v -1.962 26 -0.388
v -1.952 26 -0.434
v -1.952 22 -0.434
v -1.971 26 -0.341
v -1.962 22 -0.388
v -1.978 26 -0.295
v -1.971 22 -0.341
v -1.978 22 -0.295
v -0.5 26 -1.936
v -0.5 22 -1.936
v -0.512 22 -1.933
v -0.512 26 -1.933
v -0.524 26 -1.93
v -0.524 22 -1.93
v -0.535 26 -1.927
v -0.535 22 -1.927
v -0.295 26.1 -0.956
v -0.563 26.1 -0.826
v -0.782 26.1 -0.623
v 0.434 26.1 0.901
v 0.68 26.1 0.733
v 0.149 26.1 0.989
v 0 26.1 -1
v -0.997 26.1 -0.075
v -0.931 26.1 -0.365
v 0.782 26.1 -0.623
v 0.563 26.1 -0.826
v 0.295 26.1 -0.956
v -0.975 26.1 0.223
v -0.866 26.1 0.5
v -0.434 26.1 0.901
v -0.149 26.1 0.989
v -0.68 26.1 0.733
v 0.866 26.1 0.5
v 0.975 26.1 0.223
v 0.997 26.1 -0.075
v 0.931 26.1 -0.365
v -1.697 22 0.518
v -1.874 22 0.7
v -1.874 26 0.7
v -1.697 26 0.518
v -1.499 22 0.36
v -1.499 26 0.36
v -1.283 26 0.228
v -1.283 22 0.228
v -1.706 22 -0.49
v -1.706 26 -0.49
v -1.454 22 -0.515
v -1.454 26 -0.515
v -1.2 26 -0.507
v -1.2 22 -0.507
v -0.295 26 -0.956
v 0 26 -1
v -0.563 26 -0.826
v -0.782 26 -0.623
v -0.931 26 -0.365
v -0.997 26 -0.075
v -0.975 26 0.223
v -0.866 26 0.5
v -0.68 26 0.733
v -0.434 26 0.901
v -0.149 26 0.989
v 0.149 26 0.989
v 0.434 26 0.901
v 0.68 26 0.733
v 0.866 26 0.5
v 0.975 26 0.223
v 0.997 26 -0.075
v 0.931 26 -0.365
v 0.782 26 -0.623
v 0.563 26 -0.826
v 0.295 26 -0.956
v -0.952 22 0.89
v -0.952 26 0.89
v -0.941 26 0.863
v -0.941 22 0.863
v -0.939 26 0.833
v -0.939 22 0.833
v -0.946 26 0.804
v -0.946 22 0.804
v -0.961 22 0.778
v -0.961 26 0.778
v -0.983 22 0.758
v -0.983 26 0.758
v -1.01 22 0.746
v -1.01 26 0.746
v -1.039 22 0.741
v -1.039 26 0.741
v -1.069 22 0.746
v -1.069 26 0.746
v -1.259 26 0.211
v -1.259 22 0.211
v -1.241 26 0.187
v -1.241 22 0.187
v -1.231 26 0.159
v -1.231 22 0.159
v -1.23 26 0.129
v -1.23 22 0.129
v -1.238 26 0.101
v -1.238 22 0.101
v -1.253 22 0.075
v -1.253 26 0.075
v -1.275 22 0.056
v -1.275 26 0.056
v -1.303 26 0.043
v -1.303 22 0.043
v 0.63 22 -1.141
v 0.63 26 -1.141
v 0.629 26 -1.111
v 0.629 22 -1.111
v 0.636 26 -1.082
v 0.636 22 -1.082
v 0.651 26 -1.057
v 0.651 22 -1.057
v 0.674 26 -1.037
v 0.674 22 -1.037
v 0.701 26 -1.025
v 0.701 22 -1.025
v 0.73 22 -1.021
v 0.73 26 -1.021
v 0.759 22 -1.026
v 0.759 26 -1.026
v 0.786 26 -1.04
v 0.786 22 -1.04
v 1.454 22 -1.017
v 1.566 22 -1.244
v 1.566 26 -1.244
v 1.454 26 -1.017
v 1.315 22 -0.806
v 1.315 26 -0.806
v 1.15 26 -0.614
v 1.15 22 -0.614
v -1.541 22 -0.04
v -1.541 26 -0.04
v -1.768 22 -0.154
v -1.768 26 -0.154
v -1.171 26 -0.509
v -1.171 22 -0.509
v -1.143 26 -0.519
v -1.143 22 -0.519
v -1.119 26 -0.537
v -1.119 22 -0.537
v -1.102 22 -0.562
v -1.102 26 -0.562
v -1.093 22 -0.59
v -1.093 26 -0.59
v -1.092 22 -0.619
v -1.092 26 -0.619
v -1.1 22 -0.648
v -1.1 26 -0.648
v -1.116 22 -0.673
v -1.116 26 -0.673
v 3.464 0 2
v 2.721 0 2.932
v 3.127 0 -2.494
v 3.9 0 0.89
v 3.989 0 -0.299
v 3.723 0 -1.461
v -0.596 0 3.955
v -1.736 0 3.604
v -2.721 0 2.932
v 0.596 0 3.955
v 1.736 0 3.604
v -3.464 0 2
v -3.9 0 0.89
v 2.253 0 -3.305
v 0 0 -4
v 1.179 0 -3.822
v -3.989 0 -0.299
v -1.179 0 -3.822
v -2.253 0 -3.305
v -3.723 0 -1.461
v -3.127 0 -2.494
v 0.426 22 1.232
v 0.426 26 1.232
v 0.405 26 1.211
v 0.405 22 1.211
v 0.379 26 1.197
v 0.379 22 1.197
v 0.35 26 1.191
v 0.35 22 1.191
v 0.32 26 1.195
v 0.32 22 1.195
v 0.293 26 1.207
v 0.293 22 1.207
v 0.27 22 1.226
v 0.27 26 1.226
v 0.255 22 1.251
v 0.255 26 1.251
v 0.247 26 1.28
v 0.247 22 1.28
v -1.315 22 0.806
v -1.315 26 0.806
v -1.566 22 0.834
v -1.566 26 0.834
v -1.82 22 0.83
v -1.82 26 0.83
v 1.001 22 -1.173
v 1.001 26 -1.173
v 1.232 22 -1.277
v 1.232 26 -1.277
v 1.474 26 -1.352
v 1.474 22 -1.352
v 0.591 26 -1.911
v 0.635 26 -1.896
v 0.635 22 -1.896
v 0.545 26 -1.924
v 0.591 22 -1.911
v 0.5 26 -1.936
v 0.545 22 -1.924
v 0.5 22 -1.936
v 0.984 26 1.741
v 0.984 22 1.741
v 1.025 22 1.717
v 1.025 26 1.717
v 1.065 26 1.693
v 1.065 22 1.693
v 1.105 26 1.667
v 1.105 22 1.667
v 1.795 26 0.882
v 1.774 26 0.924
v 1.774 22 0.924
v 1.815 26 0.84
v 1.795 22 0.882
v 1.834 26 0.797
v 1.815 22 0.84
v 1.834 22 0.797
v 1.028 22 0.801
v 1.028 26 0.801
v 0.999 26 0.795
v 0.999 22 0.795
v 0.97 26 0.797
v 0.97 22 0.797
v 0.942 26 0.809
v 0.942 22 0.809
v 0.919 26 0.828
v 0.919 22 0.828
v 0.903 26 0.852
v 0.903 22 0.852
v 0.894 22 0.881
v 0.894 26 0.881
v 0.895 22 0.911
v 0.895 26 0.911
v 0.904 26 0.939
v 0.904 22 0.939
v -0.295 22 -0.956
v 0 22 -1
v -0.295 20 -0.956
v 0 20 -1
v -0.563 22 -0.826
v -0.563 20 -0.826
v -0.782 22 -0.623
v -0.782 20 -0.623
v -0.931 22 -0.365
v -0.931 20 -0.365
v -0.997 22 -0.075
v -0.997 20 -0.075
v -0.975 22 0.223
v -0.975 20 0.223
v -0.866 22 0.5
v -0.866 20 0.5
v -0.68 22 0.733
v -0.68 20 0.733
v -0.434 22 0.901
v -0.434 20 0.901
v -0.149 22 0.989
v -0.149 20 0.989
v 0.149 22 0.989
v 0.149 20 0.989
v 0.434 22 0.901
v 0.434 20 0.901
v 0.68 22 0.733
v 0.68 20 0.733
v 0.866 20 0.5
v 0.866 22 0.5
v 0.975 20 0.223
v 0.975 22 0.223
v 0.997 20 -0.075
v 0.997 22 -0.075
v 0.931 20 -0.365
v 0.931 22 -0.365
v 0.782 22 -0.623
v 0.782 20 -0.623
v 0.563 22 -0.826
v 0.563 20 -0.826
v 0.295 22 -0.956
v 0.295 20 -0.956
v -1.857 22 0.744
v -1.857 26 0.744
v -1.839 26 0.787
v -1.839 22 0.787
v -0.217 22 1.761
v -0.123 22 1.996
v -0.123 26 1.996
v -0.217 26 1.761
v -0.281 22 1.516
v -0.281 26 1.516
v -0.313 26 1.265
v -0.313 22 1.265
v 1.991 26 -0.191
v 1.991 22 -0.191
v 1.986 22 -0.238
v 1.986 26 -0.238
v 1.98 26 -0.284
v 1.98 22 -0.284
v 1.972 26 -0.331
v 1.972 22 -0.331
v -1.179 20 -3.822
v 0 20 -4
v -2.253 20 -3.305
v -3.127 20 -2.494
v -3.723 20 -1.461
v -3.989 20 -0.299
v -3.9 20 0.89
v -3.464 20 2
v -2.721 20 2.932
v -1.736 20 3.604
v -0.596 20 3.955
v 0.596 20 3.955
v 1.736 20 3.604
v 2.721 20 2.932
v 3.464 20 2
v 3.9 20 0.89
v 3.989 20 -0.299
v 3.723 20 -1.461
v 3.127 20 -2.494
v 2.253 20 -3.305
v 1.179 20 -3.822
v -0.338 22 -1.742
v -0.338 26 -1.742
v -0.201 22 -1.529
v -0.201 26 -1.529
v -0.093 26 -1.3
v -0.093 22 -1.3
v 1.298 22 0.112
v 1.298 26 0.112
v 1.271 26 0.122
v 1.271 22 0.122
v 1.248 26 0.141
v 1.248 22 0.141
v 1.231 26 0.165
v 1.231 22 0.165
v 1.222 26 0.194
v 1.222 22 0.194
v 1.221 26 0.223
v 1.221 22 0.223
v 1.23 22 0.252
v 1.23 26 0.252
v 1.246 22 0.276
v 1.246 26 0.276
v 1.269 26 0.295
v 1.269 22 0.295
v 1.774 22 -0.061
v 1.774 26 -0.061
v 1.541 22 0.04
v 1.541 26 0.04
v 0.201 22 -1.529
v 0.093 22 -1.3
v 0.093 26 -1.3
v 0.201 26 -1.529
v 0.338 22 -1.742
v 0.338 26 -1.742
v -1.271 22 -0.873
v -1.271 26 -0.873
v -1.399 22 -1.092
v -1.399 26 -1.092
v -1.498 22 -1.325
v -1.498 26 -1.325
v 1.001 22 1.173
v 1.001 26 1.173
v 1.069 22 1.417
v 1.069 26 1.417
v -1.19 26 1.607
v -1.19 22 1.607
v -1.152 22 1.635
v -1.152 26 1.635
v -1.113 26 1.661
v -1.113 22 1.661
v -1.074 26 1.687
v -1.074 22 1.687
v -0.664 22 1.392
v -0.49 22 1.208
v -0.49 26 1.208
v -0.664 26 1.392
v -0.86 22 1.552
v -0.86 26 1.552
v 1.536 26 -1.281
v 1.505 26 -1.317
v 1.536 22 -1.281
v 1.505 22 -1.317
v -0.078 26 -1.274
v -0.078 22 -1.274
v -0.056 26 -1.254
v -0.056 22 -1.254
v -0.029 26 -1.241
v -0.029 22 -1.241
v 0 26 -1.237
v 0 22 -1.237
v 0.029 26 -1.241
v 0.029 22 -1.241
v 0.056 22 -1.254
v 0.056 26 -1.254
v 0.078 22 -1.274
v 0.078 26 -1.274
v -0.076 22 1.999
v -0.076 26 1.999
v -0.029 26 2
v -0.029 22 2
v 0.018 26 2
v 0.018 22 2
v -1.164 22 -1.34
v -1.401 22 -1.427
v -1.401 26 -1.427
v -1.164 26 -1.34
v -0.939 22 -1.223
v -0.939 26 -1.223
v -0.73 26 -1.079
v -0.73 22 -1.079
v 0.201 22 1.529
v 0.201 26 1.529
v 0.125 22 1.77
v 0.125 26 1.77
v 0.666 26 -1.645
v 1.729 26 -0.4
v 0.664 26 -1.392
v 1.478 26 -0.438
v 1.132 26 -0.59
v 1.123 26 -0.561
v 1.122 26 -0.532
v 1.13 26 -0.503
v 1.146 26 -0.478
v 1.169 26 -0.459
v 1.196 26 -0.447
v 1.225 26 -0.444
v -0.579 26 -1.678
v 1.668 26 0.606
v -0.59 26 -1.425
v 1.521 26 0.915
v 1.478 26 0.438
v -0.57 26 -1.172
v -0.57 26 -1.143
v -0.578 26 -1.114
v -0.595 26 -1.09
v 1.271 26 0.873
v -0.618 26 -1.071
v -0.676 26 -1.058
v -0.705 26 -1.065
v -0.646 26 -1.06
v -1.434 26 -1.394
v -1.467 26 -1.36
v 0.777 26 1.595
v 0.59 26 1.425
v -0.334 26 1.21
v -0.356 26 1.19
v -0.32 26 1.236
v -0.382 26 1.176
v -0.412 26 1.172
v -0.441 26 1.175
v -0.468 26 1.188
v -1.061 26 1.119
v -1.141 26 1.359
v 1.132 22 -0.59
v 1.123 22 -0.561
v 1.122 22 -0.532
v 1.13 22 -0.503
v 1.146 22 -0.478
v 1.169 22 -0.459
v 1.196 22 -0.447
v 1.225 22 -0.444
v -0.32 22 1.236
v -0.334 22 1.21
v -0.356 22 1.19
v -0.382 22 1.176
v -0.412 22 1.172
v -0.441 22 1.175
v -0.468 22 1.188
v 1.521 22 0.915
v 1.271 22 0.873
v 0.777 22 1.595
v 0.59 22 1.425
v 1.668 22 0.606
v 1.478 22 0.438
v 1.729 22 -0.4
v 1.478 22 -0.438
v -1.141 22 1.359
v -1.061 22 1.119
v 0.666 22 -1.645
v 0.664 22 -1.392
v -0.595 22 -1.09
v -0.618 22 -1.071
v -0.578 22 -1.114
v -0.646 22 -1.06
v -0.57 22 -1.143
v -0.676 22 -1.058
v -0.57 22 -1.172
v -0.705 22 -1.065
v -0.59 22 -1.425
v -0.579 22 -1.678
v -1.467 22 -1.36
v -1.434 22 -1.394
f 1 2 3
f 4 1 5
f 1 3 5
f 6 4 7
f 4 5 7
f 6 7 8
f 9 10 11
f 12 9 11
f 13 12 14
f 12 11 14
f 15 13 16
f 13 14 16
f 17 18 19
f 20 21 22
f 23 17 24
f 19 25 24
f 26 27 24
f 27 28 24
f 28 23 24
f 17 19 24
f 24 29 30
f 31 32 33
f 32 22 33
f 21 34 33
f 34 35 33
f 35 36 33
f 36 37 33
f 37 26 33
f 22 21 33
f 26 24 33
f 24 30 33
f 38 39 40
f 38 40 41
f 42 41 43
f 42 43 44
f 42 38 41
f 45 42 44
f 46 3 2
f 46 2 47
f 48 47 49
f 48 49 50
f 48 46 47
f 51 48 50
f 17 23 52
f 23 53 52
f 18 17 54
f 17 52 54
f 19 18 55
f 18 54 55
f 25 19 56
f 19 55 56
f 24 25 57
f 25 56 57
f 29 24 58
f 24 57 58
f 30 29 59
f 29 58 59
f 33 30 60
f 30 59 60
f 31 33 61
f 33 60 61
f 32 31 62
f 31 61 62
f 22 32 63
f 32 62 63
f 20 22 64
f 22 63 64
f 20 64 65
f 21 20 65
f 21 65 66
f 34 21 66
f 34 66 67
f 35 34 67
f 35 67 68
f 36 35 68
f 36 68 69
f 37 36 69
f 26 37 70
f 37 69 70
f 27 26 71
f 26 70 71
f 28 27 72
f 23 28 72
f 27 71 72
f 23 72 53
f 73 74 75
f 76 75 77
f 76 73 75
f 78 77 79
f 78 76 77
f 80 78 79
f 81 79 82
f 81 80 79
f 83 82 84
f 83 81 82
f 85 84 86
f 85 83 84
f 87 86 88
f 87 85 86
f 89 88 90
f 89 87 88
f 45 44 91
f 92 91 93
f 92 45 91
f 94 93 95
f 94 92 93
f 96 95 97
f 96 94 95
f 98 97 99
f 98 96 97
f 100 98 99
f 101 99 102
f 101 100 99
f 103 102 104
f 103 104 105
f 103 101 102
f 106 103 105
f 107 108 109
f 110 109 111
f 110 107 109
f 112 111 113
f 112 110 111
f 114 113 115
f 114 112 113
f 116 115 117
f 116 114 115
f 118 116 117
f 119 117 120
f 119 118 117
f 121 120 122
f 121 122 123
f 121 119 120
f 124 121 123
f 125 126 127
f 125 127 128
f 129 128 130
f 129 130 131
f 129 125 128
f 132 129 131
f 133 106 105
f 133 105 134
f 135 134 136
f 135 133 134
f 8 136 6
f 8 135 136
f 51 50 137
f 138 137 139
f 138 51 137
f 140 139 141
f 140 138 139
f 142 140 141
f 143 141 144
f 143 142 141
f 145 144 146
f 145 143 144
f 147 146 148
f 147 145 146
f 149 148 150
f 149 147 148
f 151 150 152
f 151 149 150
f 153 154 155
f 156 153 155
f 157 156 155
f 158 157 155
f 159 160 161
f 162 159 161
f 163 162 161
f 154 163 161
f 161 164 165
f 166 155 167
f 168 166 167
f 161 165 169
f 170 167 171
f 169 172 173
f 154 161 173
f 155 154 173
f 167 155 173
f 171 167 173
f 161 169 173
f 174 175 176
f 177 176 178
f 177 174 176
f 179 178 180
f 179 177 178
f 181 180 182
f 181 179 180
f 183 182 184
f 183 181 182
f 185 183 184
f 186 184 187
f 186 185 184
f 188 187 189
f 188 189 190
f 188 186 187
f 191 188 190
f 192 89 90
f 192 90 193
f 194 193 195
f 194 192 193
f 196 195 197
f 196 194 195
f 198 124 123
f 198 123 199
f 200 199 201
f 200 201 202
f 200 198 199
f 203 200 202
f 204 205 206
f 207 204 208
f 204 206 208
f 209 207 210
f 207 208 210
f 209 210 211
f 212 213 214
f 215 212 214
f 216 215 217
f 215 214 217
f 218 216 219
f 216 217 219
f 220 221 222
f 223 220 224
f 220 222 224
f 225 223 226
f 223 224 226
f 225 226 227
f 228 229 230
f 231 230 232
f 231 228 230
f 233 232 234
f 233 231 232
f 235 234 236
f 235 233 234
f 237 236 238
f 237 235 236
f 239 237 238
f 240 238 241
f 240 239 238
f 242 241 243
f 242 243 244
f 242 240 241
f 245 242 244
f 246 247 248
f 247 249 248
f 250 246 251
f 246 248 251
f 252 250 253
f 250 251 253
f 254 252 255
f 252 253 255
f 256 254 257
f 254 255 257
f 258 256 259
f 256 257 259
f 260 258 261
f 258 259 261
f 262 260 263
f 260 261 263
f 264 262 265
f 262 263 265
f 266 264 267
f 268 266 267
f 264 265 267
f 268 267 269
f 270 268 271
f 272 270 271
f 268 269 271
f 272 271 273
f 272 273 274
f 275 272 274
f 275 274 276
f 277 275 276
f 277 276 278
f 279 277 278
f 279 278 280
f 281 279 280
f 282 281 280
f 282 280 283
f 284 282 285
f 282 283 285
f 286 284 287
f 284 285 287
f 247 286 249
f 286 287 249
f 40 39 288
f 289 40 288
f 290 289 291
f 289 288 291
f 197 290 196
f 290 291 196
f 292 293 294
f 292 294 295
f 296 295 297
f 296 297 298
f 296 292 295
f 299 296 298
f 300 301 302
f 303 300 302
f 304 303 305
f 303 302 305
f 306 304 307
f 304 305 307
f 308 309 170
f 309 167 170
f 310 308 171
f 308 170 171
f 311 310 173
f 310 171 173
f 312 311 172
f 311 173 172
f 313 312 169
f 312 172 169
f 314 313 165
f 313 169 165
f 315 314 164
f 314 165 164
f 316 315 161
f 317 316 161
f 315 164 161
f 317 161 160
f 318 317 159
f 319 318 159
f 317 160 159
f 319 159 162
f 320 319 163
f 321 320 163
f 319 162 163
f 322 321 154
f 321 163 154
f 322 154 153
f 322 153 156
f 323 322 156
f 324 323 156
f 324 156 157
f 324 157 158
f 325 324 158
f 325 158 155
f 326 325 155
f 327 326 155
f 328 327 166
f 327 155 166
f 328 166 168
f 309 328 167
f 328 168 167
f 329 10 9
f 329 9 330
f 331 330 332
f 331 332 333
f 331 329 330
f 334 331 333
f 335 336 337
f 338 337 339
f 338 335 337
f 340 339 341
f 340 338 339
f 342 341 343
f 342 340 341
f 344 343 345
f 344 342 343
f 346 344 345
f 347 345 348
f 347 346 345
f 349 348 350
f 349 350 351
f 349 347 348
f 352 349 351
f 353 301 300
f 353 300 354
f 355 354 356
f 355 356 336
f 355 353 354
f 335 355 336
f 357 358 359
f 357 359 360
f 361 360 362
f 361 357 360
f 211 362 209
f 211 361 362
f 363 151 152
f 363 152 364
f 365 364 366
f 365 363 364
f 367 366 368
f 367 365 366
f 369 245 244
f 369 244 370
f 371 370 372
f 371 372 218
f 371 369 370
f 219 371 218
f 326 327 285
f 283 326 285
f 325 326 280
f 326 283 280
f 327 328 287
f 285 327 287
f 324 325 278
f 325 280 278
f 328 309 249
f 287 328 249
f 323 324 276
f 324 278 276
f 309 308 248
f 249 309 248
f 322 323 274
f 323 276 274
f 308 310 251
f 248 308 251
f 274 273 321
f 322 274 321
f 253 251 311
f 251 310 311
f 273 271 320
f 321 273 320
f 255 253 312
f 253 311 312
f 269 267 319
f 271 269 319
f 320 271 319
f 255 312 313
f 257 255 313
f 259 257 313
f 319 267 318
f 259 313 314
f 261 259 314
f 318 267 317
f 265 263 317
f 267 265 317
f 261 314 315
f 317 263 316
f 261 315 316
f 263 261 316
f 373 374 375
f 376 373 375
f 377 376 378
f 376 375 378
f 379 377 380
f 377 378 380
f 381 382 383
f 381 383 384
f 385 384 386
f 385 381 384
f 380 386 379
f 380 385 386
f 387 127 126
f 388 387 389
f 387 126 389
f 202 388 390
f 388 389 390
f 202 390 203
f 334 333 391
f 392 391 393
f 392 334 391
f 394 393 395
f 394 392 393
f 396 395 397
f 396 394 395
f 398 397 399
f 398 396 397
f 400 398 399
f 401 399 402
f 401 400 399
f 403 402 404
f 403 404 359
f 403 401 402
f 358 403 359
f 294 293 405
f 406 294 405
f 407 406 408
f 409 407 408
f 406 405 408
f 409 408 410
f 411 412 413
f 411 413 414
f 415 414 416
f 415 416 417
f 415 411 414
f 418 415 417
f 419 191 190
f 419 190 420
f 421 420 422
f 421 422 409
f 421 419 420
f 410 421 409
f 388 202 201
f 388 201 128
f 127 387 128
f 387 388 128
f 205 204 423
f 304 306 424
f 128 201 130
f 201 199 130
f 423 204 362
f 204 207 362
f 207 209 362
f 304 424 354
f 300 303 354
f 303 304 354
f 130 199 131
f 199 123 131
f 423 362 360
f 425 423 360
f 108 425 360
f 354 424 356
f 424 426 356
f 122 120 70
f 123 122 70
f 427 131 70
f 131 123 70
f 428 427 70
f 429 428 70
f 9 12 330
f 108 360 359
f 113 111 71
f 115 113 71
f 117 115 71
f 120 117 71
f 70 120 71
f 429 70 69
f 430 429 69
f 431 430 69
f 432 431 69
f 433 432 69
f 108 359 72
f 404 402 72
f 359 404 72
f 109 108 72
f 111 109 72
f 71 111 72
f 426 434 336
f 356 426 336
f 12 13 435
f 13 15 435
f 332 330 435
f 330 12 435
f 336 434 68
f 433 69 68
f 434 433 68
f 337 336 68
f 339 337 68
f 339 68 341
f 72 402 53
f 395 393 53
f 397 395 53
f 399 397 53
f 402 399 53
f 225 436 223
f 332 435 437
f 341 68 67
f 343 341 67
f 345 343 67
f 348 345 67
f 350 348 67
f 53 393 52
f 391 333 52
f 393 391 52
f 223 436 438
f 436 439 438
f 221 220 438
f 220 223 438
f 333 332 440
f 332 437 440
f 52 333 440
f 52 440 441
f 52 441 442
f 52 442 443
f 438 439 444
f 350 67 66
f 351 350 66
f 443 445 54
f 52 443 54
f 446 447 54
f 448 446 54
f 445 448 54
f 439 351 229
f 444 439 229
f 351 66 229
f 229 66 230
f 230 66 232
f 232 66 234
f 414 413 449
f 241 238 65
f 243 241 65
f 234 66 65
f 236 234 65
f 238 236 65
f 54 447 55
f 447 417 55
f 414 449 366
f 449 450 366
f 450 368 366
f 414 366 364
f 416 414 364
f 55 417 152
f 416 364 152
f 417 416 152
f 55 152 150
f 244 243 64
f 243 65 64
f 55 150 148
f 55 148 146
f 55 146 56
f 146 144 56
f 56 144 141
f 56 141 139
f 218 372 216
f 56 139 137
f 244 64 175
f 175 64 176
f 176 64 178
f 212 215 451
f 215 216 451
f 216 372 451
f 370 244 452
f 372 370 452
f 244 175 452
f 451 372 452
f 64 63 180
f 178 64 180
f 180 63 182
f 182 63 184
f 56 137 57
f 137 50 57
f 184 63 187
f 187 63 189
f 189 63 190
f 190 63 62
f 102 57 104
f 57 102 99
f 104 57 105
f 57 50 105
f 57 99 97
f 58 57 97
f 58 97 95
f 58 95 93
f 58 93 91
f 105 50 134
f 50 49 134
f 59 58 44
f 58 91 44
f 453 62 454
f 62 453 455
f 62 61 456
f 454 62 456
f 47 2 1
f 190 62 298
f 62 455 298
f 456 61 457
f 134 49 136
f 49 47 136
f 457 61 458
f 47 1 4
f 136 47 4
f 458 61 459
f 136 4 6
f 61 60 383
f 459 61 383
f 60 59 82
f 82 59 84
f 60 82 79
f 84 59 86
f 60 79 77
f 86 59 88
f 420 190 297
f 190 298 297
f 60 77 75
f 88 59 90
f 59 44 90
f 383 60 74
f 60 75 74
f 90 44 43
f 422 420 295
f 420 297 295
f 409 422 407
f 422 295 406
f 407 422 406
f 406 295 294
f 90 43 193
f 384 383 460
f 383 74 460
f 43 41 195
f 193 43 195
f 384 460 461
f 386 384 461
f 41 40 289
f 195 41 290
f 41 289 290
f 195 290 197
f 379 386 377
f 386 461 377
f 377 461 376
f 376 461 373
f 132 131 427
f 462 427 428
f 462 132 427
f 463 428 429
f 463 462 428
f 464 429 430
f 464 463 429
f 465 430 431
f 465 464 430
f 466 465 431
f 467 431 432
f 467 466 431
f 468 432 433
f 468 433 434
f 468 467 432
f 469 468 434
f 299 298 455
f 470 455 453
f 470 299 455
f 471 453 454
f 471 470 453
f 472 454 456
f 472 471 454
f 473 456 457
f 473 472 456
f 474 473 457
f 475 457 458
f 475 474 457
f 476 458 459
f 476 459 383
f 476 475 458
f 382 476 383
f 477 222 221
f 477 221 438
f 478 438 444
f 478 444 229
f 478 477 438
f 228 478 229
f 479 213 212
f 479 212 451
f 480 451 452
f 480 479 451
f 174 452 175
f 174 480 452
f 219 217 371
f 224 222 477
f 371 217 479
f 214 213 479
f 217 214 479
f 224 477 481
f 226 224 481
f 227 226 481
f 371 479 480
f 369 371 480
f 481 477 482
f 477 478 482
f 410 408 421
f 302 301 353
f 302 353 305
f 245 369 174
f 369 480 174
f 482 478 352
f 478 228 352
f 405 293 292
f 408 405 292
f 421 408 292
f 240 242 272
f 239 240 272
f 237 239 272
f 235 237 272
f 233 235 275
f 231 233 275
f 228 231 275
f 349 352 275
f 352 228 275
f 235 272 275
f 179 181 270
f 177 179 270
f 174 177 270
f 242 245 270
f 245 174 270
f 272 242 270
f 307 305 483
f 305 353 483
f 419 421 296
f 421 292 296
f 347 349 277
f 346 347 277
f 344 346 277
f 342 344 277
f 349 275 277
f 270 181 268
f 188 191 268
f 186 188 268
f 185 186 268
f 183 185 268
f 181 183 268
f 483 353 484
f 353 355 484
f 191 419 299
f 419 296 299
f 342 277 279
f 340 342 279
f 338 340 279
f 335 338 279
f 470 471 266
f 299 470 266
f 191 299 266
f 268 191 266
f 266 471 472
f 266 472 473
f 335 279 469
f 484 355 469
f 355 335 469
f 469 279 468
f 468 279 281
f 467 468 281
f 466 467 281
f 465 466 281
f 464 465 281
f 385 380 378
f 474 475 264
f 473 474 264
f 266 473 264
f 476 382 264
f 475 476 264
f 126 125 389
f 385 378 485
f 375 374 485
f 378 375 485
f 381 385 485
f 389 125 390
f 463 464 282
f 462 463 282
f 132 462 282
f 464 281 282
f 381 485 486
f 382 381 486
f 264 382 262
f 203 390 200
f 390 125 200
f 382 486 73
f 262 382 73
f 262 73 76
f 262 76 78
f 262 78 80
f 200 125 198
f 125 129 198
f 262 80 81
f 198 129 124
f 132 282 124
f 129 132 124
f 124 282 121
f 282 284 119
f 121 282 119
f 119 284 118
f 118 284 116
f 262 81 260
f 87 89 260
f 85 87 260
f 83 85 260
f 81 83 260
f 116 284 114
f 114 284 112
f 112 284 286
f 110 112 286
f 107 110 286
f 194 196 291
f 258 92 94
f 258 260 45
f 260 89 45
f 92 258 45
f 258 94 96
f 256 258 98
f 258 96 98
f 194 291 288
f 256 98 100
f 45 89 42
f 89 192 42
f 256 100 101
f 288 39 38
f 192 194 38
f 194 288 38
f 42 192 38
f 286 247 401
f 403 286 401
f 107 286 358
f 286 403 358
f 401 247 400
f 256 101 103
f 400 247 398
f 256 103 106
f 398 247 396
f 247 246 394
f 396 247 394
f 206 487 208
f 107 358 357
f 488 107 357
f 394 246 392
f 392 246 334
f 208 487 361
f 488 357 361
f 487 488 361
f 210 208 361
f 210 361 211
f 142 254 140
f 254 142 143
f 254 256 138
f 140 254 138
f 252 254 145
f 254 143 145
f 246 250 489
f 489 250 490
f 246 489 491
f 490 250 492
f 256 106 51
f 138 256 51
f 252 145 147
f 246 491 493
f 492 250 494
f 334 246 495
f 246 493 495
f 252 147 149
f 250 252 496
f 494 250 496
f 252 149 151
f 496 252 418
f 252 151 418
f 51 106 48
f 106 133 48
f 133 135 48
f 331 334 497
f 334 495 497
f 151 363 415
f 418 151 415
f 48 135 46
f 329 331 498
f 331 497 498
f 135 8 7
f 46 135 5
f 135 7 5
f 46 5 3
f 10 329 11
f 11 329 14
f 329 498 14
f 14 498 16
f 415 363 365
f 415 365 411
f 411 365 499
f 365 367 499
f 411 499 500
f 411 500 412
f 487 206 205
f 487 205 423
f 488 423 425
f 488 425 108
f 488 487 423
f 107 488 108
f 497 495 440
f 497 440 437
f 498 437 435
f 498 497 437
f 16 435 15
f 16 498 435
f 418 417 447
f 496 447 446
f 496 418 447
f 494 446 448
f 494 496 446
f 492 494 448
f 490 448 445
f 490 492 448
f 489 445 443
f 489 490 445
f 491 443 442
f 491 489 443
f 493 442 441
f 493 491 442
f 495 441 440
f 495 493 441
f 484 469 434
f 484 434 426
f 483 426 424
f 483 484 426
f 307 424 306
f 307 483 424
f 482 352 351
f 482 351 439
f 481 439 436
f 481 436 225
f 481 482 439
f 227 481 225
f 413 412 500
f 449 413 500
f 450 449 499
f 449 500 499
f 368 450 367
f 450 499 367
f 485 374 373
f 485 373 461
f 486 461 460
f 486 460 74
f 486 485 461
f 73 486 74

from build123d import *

# Parameters (mm, degrees)
CUT_EXTRUDE_START        = -4.3
CUT_EXTRUDE_1_DEPTH      = 4.3
PATTERN_CIRCULAR_1_COUNT = 11
PATTERN_CIRCULAR_1_ANGLE = 330


with BuildPart() as part:
    # ｽｹｯﾁ1 → 回転1 (revolve)
    with BuildSketch(Plane.XY, mode=Mode.PRIVATE) as revolve_1_sk:
        Polygon((0, 0), (0, 26.1), (1, 26.1), (1, 26), (2, 26), (2, 22), (1, 22), (1, 20), (4, 20), (4, 0), align=None)
    revolve(revolve_1_sk.sketch.rotate(Axis((0, 0, 0), (0, 1, 0)), 90), axis=Axis((0, 0, 0), (0, 1, 0)))

    # ｽｹｯﾁ3 → ｶｯﾄ - 押し出し1 (cut)
    with BuildSketch(Plane(origin=(0, 26, 0), x_dir=(1, 0, 0), z_dir=(0, 1, 0)).offset(CUT_EXTRUDE_START)):
        with BuildLine():
            ThreePointArc((0.092905413, 1.299949383), (0.266119458, 1.637619869), (0.5, 1.936491673))
            ThreePointArc((0.5, 1.936491673), (0, 2), (-0.5, 1.936491673))
            ThreePointArc((-0.5, 1.936491673), (-0.266119458, 1.637619869), (-0.092905413, 1.299949383))
            ThreePointArc((-0.092905413, 1.299949383), (0, 1.236943764), (0.092905413, 1.299949383))
        make_face()
    cut_extrude_1 = extrude(amount=CUT_EXTRUDE_1_DEPTH, mode=Mode.SUBTRACT)

    # 円形ﾊﾟﾀｰﾝ1: ｶｯﾄ - 押し出し1 ×11 about axis
    pattern_circular_1_axis = Axis((0, 0, 0), (0, -1, 0))
    for i in range(1, PATTERN_CIRCULAR_1_COUNT):
        add(cut_extrude_1.rotate(pattern_circular_1_axis, i * PATTERN_CIRCULAR_1_ANGLE / (PATTERN_CIRCULAR_1_COUNT - 1)), mode=Mode.SUBTRACT)


solid = part.part
